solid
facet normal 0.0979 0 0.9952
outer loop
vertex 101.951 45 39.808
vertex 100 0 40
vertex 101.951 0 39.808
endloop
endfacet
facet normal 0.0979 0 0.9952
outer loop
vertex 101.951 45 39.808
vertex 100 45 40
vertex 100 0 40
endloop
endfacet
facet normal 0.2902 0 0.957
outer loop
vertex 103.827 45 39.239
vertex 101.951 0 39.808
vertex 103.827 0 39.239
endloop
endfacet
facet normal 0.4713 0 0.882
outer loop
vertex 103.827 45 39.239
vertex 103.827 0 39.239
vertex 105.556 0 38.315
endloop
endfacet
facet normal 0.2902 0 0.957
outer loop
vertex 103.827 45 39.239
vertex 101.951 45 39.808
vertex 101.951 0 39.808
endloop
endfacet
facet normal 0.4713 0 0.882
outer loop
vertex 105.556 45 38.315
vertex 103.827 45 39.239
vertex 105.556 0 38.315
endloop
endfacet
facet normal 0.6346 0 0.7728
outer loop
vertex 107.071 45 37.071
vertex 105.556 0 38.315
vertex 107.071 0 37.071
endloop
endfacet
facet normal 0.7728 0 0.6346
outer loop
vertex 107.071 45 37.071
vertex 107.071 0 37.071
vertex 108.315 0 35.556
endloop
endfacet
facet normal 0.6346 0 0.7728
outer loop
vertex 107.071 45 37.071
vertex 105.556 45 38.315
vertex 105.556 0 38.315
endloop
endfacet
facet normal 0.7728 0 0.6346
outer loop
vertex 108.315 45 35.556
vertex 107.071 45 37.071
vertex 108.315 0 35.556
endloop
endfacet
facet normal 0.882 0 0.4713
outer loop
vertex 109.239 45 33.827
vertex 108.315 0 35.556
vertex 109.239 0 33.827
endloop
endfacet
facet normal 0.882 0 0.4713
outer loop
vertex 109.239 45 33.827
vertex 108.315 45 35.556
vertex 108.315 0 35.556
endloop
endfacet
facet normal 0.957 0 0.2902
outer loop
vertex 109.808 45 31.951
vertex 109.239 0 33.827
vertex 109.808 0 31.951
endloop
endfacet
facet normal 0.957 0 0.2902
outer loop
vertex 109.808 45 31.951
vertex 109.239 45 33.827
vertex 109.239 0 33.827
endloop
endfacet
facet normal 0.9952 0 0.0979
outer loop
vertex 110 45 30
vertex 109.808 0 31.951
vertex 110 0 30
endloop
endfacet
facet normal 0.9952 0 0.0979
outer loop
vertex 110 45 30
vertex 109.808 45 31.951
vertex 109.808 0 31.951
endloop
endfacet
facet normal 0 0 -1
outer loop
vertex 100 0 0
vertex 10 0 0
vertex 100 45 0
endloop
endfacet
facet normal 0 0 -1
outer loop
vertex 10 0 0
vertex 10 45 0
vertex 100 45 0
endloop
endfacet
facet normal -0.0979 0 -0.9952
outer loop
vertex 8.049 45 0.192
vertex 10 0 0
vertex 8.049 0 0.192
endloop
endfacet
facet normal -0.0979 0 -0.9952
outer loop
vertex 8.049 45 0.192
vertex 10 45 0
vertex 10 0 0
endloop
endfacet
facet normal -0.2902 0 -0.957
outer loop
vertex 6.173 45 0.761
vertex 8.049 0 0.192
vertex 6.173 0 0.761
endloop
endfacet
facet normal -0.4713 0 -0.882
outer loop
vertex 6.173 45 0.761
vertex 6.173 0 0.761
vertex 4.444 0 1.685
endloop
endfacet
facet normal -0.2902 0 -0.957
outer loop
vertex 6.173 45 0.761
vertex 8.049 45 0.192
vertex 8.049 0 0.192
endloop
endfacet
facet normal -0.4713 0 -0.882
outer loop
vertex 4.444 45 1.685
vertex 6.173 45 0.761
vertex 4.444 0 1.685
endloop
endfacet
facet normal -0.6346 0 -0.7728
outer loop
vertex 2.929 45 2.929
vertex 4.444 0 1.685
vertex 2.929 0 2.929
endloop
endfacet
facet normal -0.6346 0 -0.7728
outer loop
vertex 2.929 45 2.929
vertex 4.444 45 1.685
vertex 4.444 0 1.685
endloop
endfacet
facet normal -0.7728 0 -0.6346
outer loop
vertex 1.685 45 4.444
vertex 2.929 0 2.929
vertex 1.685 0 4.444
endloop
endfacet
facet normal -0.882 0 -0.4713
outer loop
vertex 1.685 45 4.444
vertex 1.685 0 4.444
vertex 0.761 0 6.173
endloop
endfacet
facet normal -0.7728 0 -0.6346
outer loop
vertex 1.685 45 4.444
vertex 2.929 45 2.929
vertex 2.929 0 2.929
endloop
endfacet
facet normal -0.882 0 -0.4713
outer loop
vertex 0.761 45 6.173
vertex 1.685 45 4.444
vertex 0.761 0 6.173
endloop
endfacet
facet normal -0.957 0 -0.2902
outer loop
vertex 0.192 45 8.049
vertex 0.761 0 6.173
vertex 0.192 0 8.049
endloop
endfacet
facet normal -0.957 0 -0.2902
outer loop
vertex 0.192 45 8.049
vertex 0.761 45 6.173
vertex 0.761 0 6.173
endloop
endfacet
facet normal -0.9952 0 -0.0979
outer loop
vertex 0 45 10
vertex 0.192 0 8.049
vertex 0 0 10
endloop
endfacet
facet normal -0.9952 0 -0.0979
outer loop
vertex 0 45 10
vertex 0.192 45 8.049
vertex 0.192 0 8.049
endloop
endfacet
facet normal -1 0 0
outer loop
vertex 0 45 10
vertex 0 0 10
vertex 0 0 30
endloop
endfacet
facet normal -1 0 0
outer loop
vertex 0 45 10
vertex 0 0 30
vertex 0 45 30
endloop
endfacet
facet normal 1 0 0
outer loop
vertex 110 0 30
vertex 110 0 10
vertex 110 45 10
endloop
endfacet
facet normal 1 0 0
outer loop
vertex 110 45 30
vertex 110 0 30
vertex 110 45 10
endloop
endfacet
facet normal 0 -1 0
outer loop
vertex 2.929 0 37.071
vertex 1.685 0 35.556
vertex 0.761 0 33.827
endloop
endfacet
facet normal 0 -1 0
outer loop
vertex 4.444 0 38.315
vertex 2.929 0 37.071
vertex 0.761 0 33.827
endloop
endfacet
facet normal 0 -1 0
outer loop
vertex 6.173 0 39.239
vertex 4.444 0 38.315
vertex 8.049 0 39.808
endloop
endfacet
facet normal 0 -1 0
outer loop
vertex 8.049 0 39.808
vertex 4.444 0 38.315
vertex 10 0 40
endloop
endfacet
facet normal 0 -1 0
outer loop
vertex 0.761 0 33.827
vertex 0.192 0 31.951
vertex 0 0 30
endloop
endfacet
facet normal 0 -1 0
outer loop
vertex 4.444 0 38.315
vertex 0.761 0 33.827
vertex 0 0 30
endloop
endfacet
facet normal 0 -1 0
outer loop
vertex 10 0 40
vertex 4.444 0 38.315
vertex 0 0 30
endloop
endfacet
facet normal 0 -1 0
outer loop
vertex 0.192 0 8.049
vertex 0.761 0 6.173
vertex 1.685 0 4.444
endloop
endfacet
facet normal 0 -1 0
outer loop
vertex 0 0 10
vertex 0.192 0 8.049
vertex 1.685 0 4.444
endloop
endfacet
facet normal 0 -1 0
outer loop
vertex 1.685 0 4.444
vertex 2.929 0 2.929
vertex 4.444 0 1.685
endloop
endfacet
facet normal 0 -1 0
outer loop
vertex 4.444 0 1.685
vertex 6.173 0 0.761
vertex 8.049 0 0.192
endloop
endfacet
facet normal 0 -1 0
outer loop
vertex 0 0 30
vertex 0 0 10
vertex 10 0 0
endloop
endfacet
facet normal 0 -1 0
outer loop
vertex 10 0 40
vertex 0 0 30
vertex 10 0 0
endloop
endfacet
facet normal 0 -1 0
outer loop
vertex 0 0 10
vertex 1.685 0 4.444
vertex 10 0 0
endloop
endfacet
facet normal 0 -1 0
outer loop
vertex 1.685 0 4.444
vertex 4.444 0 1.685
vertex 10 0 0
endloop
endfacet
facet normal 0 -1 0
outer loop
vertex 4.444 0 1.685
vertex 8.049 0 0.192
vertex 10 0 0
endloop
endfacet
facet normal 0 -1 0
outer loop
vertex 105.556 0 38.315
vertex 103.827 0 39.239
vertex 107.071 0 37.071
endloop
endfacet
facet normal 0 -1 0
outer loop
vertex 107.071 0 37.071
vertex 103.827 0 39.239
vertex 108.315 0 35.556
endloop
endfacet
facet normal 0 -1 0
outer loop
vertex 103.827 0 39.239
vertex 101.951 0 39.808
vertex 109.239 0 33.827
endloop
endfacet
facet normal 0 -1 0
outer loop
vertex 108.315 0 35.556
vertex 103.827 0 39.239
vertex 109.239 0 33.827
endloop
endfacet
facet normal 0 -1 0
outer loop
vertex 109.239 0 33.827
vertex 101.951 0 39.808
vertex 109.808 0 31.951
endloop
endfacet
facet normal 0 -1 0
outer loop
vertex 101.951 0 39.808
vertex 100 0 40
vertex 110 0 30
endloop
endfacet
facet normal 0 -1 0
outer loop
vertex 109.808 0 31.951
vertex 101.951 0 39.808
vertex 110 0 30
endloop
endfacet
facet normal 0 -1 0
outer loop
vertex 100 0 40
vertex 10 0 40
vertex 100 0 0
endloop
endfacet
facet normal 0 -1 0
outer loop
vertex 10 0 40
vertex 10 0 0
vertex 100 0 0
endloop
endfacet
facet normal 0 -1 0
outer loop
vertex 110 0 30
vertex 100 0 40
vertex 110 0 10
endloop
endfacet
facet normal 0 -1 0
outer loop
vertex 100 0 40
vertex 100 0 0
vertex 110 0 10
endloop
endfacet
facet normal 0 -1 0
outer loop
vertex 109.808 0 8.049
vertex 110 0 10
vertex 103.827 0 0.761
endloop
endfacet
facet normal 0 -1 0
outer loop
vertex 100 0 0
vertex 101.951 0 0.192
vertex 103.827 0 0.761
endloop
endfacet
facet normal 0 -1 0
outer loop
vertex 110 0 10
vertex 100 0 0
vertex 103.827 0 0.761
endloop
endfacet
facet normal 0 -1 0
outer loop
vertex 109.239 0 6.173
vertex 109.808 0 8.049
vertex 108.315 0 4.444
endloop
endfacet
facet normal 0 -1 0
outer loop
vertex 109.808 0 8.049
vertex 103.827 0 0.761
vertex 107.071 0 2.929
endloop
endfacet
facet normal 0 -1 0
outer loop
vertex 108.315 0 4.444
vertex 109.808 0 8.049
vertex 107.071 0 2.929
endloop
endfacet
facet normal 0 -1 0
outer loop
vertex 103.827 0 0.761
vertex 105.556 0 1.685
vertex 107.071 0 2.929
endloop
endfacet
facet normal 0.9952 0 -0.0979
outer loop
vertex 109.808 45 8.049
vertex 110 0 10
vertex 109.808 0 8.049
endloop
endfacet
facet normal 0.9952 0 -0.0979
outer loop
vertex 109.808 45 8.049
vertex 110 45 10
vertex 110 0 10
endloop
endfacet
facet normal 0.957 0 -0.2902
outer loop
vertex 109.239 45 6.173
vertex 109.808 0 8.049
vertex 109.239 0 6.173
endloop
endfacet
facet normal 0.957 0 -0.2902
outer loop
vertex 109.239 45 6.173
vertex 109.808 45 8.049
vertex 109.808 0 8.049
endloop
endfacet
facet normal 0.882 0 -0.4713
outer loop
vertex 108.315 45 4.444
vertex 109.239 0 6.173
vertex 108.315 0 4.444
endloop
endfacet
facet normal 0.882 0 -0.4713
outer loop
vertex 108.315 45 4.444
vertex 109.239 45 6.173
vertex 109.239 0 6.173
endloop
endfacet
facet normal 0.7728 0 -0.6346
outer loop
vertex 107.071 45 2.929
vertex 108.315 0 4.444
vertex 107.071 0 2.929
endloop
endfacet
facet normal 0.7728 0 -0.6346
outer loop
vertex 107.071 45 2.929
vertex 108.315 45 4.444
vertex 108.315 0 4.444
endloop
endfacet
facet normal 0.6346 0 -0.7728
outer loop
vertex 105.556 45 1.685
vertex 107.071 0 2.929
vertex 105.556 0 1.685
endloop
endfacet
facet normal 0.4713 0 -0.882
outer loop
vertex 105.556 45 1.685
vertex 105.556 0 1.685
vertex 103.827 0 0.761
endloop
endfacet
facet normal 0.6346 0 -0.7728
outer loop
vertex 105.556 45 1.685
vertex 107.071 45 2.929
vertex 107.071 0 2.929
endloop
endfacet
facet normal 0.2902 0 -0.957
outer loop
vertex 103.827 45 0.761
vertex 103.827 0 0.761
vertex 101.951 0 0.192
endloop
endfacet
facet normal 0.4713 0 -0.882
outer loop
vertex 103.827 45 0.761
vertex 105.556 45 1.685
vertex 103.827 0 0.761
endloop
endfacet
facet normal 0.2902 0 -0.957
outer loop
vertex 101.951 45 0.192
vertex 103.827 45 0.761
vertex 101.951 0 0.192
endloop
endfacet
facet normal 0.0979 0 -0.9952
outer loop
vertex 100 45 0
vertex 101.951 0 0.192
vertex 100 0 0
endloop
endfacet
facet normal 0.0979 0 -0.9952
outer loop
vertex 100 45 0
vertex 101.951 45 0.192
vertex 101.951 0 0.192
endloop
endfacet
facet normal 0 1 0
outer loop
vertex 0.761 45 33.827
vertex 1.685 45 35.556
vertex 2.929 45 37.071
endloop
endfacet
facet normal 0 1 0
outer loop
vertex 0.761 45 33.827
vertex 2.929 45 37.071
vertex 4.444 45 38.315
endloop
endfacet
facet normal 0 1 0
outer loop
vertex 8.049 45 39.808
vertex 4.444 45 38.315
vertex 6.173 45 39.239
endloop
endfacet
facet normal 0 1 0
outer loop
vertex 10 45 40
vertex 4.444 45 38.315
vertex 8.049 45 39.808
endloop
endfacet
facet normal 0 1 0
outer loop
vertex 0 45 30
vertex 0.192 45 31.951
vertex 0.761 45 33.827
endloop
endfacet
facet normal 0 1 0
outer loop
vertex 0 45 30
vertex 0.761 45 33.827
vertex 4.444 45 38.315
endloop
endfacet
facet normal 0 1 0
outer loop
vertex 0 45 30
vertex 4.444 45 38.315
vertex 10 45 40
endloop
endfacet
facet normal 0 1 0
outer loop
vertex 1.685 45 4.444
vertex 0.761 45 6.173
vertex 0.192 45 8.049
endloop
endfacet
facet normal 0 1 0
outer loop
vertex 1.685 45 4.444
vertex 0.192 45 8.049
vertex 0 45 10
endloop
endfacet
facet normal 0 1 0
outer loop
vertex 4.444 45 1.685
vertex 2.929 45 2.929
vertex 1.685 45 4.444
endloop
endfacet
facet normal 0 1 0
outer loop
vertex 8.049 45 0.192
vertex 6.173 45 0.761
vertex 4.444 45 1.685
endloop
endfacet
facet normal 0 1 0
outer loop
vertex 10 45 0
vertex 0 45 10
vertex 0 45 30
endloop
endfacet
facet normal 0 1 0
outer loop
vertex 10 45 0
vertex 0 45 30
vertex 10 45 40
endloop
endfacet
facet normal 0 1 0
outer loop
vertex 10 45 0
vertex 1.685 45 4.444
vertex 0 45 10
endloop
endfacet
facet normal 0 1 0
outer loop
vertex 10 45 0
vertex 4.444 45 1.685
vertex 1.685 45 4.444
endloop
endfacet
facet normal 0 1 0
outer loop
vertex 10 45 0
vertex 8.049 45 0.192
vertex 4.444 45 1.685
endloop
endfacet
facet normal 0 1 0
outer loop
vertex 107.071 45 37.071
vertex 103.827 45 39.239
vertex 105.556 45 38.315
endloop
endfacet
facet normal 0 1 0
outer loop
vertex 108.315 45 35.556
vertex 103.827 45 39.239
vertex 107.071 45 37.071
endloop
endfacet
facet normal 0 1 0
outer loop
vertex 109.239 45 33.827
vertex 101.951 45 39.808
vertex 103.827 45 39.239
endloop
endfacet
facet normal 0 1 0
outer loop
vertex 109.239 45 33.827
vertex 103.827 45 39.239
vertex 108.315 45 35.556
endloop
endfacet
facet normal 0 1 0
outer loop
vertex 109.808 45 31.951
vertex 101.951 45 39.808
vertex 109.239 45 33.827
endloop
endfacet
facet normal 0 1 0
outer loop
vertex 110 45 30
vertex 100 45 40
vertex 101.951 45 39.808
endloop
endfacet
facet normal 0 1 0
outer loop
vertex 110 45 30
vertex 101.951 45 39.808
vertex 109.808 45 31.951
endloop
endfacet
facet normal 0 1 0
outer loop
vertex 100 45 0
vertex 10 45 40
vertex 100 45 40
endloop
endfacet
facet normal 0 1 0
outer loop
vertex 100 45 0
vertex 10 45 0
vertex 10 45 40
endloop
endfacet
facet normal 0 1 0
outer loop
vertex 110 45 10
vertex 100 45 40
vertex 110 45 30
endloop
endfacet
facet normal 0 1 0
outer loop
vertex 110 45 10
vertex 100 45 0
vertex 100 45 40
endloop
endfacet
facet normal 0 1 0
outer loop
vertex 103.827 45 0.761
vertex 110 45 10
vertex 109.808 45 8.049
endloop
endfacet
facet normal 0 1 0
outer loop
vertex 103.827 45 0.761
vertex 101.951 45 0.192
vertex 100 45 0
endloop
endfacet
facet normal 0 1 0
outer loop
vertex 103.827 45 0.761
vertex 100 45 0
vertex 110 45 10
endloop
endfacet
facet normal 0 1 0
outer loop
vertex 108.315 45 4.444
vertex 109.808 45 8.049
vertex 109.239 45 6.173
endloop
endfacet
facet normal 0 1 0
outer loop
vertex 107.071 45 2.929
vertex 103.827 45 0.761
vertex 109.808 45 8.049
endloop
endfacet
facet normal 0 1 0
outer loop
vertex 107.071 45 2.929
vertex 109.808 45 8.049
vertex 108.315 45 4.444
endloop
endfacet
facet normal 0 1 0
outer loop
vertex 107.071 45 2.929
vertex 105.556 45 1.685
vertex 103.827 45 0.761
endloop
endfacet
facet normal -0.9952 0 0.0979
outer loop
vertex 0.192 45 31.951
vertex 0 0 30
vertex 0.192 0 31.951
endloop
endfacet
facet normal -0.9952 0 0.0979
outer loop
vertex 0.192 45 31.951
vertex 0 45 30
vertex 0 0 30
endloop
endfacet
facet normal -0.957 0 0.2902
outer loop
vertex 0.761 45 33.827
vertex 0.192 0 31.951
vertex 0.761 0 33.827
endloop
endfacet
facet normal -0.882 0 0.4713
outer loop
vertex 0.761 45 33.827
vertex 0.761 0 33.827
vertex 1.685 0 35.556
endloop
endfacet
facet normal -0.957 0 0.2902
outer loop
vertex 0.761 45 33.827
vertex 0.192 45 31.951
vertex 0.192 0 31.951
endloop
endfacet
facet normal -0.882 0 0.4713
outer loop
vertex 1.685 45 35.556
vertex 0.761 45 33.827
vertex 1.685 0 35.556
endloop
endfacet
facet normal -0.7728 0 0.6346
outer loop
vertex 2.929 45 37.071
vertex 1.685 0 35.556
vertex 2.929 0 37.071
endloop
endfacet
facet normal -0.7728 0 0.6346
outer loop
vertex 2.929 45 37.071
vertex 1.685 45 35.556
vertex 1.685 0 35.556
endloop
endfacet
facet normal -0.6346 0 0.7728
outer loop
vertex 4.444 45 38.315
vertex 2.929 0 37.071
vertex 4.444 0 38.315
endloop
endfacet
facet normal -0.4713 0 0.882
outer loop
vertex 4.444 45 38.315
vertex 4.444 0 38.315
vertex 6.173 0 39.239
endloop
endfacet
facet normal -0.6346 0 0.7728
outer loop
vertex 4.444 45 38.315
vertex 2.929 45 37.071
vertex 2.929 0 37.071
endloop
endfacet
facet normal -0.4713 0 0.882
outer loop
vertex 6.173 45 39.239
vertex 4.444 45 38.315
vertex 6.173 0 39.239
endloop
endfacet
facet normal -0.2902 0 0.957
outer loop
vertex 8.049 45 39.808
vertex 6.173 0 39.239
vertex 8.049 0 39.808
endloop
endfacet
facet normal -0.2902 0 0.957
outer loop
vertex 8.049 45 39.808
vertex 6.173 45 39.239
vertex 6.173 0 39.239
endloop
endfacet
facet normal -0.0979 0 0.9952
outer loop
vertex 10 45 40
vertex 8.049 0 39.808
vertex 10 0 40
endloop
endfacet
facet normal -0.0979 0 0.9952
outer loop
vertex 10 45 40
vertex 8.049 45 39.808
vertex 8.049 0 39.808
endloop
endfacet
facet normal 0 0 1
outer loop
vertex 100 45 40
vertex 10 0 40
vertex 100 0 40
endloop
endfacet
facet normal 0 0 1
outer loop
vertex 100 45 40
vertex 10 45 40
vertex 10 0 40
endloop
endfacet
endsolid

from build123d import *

# Parameters (mm, degrees)
ESQUISSE1_W        = 110
ESQUISSE1_H        = 45
BOSS_EXTRU_1_DEPTH = 40
CONG_1_R           = 10
CONG_2_R           = 10
CONG_3_R           = 10
CONG_4_R           = 10


with BuildPart() as part:
    # Esquisse1 → Boss.-Extru.1 (new body)
    with BuildSketch(Plane.XY):
        with Locations((55, 22.5)):
            Rectangle(ESQUISSE1_W, ESQUISSE1_H)
    extrude(amount=BOSS_EXTRU_1_DEPTH)

    # Congé1
    cong_1_edges = [part.edges().sort_by_distance(p)[0] for p in [
        (0, 22.5, 40),
    ]]
    fillet(cong_1_edges, radius=CONG_1_R)

    # Congé2
    cong_2_edges = [part.edges().sort_by_distance(p)[0] for p in [
        (110, 22.5, 40),
    ]]
    fillet(cong_2_edges, radius=CONG_2_R)

    # Congé3
    cong_3_edges = [part.edges().sort_by_distance(p)[0] for p in [
        (110, 22.5, 0),
    ]]
    fillet(cong_3_edges, radius=CONG_3_R)

    # Congé4
    cong_4_edges = [part.edges().sort_by_distance(p)[0] for p in [
        (0, 22.5, 0),
    ]]
    fillet(cong_4_edges, radius=CONG_4_R)


solid = part.part
